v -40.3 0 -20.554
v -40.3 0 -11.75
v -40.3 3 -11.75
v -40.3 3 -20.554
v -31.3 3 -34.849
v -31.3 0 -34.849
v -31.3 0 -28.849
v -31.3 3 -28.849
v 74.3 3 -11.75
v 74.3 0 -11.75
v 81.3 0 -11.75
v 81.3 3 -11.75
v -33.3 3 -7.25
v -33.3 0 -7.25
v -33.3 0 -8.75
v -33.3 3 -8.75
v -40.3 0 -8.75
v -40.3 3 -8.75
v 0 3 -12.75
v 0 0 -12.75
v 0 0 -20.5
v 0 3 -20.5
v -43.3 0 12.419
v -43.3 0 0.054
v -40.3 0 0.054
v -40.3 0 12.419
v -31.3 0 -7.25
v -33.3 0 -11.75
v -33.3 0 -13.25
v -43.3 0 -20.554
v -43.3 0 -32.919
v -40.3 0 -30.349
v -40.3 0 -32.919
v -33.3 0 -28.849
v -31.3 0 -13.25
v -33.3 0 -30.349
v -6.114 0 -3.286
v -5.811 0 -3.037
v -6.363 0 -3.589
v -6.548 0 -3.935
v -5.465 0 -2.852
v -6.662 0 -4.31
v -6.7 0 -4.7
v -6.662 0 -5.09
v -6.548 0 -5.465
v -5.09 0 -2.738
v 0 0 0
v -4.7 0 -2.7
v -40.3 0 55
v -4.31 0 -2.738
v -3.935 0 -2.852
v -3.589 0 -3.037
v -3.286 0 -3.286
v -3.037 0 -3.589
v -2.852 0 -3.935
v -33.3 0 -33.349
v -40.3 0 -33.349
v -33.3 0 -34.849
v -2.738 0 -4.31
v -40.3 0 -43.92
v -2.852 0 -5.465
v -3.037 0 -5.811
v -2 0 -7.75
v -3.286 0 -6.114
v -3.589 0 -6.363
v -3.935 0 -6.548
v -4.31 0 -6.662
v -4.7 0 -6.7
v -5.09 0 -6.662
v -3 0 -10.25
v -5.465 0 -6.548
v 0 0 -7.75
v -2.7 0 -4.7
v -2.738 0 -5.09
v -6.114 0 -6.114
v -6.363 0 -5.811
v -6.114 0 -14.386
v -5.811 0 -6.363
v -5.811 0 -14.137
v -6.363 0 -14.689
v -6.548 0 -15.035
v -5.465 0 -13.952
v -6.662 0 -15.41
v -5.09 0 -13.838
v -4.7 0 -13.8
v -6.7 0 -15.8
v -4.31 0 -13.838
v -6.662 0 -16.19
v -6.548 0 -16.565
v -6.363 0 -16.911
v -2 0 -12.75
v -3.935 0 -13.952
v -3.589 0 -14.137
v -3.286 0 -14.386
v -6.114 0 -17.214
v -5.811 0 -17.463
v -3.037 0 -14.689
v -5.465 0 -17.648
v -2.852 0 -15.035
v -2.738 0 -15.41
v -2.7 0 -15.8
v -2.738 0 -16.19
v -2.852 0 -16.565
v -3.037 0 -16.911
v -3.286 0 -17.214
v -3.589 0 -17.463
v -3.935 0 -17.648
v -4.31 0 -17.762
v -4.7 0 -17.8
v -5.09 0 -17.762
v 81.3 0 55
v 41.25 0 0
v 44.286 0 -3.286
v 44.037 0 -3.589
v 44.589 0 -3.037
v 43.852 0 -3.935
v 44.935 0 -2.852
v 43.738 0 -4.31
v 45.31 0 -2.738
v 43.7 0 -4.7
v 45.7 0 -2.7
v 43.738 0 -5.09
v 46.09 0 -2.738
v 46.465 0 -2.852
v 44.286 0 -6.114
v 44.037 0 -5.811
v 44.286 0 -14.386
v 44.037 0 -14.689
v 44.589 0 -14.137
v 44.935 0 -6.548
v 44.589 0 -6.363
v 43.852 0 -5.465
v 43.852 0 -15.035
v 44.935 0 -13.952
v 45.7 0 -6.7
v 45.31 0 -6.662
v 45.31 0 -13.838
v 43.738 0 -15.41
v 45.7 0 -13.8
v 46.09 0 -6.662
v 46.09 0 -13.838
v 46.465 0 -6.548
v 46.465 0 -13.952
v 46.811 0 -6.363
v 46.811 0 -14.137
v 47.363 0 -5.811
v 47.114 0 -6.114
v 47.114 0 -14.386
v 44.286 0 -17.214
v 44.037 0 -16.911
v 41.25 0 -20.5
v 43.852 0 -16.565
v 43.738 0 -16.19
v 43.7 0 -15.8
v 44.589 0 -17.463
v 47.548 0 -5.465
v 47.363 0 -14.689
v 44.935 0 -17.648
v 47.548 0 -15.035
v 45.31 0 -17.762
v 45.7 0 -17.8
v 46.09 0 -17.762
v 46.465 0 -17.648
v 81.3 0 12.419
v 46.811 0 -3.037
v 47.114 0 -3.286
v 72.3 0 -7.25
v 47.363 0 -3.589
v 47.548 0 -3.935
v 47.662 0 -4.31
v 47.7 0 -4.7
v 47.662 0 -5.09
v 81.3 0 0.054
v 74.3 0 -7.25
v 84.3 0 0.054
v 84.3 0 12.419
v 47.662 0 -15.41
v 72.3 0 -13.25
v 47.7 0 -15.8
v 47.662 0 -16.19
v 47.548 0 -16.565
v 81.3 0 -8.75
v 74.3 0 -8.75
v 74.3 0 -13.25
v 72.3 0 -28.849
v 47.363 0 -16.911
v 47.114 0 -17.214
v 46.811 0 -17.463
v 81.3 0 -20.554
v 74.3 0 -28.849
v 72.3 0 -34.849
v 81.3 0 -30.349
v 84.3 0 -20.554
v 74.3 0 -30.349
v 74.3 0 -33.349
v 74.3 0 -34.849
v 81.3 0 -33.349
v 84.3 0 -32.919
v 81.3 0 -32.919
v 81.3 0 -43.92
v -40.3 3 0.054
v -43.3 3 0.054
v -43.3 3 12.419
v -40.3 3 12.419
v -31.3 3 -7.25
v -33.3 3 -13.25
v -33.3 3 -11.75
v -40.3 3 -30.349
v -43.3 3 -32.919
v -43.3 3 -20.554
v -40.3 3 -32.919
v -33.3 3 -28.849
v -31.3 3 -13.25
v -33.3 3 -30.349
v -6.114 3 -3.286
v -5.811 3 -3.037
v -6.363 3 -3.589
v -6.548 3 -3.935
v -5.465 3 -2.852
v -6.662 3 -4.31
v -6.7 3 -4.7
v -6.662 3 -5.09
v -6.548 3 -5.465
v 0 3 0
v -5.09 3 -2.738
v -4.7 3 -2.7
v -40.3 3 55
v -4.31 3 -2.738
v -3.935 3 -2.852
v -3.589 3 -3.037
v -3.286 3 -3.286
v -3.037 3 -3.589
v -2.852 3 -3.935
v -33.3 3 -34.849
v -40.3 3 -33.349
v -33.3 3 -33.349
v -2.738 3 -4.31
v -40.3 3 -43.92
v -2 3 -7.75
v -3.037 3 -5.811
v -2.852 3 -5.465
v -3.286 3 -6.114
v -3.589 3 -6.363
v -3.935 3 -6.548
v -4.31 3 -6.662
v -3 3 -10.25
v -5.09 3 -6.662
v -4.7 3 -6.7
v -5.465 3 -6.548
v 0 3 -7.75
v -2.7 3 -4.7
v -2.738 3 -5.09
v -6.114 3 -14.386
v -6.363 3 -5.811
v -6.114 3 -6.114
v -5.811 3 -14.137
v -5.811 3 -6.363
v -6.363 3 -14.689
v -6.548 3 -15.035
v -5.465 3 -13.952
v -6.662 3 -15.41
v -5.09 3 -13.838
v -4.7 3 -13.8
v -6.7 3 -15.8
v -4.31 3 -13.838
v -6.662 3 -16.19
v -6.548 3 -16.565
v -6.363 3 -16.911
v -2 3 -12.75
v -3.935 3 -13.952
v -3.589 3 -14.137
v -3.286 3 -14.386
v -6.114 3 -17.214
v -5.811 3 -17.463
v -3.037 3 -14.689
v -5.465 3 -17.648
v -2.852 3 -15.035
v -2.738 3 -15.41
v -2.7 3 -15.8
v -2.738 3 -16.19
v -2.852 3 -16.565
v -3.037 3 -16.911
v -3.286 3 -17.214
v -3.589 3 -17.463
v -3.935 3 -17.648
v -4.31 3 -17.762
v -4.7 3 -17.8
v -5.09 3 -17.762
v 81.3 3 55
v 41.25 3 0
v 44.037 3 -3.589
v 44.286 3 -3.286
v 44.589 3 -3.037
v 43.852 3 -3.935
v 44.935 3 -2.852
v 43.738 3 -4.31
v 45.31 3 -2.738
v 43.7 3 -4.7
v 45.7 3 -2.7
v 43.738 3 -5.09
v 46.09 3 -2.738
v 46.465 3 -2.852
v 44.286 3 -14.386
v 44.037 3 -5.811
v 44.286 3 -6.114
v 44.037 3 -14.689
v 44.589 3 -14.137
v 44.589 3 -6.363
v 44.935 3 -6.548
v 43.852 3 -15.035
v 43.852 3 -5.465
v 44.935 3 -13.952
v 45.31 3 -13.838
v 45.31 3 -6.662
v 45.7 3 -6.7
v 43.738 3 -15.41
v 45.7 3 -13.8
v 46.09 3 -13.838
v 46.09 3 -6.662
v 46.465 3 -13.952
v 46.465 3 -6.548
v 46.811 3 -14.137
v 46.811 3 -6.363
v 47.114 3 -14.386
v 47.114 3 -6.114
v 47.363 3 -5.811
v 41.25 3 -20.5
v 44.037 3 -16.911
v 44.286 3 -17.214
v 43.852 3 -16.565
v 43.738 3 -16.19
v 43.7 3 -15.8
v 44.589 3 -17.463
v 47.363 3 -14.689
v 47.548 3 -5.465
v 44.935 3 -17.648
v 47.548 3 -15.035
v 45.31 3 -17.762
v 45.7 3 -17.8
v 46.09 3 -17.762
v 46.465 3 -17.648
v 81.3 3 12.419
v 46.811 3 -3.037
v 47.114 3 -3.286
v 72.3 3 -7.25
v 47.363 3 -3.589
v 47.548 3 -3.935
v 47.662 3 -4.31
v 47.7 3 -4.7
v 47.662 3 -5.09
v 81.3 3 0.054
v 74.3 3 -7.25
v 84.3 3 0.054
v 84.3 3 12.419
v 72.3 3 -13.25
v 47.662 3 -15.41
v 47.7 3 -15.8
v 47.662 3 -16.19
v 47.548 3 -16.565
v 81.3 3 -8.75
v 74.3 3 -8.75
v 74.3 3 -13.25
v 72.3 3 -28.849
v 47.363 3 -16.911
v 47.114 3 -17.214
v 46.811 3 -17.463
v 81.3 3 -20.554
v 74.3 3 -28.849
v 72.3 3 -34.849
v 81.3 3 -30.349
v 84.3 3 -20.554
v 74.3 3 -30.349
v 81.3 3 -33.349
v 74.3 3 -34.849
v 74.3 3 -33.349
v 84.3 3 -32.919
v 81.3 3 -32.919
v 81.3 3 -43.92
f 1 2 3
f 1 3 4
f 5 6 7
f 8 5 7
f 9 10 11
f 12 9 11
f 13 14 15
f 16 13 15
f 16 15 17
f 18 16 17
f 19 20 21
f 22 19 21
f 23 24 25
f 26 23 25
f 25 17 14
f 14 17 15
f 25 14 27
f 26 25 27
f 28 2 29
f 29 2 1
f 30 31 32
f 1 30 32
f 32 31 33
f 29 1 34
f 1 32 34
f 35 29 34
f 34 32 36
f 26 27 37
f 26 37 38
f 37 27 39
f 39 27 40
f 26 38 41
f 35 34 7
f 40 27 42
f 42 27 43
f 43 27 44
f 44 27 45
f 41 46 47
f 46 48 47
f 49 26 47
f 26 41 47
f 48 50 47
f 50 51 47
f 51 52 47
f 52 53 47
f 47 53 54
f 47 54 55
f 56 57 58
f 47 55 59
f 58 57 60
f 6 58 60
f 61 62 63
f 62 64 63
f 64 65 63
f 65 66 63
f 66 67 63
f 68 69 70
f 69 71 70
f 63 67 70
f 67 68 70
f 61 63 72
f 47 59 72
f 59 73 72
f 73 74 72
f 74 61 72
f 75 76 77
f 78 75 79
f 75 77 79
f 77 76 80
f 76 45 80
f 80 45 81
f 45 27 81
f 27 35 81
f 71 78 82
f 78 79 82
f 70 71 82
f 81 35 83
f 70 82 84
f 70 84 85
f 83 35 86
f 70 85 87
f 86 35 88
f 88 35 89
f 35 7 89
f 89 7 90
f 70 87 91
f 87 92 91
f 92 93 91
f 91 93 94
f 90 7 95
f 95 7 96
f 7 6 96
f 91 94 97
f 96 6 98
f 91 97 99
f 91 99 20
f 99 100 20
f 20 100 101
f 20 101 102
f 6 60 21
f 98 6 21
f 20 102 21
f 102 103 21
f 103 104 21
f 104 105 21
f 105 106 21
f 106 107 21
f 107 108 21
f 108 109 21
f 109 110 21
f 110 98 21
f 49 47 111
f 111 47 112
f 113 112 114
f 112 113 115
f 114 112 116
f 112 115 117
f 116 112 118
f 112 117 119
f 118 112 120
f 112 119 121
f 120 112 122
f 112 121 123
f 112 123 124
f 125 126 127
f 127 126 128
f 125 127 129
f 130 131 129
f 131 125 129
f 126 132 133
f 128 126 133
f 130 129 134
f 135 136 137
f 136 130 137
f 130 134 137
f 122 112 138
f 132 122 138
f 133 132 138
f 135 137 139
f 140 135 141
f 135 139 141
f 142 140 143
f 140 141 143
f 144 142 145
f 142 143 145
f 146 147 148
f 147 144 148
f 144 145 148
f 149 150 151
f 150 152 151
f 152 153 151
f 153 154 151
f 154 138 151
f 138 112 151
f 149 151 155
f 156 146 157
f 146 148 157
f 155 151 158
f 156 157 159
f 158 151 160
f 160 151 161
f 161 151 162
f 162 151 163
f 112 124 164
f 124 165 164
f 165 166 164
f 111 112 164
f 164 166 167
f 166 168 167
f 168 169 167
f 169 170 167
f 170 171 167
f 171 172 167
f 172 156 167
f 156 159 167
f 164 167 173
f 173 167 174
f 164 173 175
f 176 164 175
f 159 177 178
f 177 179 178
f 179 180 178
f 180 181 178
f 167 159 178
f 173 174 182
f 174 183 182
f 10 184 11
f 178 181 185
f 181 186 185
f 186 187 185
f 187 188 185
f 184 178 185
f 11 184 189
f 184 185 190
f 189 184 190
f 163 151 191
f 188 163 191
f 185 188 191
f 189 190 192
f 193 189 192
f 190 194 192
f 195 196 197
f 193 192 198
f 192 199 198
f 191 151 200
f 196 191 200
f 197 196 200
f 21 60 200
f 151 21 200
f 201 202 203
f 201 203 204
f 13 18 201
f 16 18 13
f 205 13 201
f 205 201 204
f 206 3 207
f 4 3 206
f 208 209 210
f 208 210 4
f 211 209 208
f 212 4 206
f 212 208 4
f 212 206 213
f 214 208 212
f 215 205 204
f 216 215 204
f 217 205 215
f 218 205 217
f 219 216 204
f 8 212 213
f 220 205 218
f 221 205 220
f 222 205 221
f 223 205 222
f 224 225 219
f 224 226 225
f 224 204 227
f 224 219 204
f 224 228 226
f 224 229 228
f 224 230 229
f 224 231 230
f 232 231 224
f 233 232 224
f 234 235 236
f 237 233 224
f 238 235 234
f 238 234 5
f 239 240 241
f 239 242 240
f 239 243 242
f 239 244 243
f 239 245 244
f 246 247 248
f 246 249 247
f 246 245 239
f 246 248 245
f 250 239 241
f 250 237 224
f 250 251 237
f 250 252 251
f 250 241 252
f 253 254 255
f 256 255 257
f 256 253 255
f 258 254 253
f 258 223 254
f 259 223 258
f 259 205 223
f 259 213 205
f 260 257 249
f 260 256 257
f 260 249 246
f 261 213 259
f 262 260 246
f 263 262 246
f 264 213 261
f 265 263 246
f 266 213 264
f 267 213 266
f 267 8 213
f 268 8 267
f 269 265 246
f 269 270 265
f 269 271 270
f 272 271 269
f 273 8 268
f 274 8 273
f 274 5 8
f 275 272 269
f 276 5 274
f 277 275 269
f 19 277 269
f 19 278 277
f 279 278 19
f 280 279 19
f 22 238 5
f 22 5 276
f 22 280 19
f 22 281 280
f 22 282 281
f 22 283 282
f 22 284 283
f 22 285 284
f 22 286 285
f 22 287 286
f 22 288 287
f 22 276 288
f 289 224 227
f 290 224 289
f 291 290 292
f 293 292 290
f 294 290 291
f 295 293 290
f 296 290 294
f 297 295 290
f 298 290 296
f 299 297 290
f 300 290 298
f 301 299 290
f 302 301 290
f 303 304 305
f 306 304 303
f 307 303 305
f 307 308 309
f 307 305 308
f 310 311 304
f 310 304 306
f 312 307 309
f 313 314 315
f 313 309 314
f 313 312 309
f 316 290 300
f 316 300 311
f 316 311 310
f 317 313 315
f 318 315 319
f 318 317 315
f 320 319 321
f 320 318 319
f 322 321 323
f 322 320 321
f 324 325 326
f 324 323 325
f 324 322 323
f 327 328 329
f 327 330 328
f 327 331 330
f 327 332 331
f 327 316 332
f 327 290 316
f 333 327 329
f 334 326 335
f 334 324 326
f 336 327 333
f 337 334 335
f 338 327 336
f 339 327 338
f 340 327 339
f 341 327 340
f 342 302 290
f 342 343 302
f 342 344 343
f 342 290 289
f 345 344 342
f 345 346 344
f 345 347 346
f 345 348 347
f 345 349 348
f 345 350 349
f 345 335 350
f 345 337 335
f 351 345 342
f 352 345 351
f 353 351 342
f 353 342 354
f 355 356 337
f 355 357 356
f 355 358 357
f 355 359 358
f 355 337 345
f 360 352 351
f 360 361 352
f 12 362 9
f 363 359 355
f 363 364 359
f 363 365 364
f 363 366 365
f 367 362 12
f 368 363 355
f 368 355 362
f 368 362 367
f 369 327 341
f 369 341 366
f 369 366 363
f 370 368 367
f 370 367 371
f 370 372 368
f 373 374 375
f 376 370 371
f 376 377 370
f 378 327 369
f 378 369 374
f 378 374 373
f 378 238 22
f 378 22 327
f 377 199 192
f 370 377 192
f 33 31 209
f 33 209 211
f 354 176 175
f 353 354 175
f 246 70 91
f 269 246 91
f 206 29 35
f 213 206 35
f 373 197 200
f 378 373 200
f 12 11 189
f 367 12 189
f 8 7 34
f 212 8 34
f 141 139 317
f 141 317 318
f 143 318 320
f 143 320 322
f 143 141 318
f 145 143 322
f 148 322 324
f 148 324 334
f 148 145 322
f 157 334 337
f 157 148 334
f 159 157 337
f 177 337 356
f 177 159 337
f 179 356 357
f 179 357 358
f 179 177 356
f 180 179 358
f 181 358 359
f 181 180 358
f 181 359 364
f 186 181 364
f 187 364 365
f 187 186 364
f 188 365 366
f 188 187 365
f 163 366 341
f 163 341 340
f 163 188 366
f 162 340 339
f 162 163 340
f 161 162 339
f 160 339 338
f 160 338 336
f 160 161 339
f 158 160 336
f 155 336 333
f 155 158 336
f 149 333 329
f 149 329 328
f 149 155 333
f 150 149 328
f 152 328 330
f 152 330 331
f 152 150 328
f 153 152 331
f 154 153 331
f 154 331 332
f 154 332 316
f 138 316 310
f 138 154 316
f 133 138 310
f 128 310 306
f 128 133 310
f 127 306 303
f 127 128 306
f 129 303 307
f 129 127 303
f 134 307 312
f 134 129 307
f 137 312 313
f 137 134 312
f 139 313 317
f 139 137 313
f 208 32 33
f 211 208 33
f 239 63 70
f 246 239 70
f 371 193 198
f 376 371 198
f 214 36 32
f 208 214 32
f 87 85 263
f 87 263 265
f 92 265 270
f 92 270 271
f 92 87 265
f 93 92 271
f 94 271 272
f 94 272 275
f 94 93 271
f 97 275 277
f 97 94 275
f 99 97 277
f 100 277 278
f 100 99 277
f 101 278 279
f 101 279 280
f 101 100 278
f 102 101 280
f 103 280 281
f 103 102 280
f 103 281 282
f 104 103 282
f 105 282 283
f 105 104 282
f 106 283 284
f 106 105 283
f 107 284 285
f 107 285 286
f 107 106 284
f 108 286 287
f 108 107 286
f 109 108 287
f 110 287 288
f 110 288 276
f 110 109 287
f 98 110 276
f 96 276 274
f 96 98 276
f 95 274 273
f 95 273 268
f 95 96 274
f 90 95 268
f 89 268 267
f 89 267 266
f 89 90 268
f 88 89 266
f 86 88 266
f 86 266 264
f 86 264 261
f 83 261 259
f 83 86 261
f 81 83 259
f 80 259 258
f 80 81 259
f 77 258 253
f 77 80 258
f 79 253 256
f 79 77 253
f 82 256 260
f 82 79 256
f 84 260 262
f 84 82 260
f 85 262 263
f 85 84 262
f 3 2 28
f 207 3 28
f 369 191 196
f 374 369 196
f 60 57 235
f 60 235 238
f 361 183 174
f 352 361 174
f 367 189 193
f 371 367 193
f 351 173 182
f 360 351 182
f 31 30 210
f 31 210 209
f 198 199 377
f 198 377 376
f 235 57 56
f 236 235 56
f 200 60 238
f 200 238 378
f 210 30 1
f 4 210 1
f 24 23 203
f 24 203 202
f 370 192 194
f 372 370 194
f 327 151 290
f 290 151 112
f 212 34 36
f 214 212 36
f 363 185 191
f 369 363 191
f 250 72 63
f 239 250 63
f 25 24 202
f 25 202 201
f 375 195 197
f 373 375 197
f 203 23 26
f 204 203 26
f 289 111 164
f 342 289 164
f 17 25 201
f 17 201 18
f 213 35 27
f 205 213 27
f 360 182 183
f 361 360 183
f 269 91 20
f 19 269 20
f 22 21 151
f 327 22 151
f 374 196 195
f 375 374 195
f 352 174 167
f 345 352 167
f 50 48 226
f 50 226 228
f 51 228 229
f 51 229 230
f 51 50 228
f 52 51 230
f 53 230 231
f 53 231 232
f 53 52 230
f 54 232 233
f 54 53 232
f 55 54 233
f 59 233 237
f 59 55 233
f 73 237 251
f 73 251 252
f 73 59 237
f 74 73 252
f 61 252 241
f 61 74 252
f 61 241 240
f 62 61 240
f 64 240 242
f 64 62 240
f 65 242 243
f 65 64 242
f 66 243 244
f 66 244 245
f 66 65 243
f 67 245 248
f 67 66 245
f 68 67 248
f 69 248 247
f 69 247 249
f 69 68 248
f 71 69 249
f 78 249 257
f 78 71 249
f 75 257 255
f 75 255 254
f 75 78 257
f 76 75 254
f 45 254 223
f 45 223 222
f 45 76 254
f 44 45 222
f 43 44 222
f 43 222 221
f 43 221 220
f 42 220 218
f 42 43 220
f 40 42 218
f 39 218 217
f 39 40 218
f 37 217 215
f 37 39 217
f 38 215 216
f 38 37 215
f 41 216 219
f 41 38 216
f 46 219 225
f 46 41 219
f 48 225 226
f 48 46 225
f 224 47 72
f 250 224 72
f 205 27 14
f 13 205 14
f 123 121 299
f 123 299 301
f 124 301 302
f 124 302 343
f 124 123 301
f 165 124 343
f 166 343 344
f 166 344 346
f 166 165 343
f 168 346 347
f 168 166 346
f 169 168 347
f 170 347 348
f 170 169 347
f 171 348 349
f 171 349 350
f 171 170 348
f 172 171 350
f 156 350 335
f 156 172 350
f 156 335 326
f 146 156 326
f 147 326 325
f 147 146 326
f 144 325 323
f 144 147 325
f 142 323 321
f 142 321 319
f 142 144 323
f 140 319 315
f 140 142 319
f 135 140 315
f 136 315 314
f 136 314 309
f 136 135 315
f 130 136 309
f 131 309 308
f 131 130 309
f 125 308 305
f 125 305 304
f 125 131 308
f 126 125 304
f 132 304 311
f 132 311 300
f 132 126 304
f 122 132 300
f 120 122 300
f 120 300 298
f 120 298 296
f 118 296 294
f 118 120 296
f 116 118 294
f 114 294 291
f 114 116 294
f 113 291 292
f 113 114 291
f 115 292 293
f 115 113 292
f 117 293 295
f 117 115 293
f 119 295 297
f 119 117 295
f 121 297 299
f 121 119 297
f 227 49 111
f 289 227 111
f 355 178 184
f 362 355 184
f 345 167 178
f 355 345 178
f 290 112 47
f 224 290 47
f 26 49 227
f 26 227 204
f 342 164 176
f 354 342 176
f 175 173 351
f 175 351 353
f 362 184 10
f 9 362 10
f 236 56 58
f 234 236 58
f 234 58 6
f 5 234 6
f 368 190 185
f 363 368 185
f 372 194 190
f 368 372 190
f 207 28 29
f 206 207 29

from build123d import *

# Parameters (mm, degrees)
SKETCH2_W           = 121.6
SKETCH2_H           = 98.919653249
SKETCH2_R           = 2
BOSS_EXTRUDE1_DEPTH = 3
SKETCH3_W           = 3
SKETCH3_H           = 12.364956656
BOSS_EXTRUDE2_DEPTH = 3
CUT_EXTRUDE1_DEPTH  = 101.7


with BuildPart() as part:
    # Sketch2 → Boss-Extrude1 (new body)
    with BuildSketch(Plane(origin=(0, 0, 0), x_dir=(1, 0, 0), z_dir=(0, 1, 0))):
        with Locations((20.5, -5.540173376)):
            Rectangle(SKETCH2_W, SKETCH2_H)
        Polygon((41.25, 0), (0, 0), (0, 7.75), (-2, 7.75), (-3, 10.25), (-2, 12.75), (0, 12.75), (0, 20.5), (41.25, 20.5), align=None, mode=Mode.SUBTRACT)
        with Locations(Location((-4.7, 4.7, 0), (0, 0, 270))):
            Circle(SKETCH2_R, mode=Mode.SUBTRACT)
        with Locations(Location((-4.7, 15.8, 0), (0, 0, 270))):
            Circle(SKETCH2_R, mode=Mode.SUBTRACT)
        with Locations(Location((45.7, 4.7, 0), (0, 0, 270))):
            Circle(SKETCH2_R, mode=Mode.SUBTRACT)
        with Locations(Location((45.7, 15.8, 0), (0, 0, 270))):
            Circle(SKETCH2_R, mode=Mode.SUBTRACT)
    extrude(amount=BOSS_EXTRUDE1_DEPTH)

    # Sketch3 → Boss-Extrude2 (add, through all)
    with BuildSketch(Plane(origin=(0, 0, 0), x_dir=(1, 0, 0), z_dir=(0, 1, 0))):
        with Locations((-41.8, 26.736608875)):
            Rectangle(SKETCH3_W, SKETCH3_H)
        with Locations((-41.8, -6.236608875)):
            Rectangle(SKETCH3_W, SKETCH3_H)
        with Locations((82.8, -6.236608875)):
            Rectangle(SKETCH3_W, SKETCH3_H)
        with Locations((82.8, 26.736608875)):
            Rectangle(SKETCH3_W, SKETCH3_H)
    extrude(amount=BOSS_EXTRUDE2_DEPTH)

    # Sketch4 → Cut-Extrude1 (cut, through all)
    with BuildSketch(Plane(origin=(0, 0, 0), x_dir=(1, 0, 0), z_dir=(0, 1, 0))):
        Polygon((81.3, 8.75), (74.3, 8.75), (74.3, 7.25), (72.3, 7.25), (72.3, 13.25), (74.3, 13.25), (74.3, 11.75), (81.3, 11.75), align=None)
        Polygon((81.3, 30.348544885), (74.3, 30.348544885), (74.3, 28.848544885), (72.3, 28.848544885), (72.3, 34.848544885), (74.3, 34.848544885), (74.3, 33.348544885), (81.3, 33.348544885), align=None)
        Polygon((-40.3, 30.348544885), (-40.3, 33.348544885), (-33.3, 33.348544885), (-33.3, 34.848544885), (-31.3, 34.848544885), (-31.3, 28.848544885), (-33.3, 28.848544885), (-33.3, 30.348544885), align=None)
        Polygon((-40.3, 8.75), (-40.3, 11.75), (-33.3, 11.75), (-33.3, 13.25), (-31.3, 13.25), (-31.3, 7.25), (-33.3, 7.25), (-33.3, 8.75), align=None)
    extrude(amount=CUT_EXTRUDE1_DEPTH, mode=Mode.SUBTRACT)


solid = part.part
